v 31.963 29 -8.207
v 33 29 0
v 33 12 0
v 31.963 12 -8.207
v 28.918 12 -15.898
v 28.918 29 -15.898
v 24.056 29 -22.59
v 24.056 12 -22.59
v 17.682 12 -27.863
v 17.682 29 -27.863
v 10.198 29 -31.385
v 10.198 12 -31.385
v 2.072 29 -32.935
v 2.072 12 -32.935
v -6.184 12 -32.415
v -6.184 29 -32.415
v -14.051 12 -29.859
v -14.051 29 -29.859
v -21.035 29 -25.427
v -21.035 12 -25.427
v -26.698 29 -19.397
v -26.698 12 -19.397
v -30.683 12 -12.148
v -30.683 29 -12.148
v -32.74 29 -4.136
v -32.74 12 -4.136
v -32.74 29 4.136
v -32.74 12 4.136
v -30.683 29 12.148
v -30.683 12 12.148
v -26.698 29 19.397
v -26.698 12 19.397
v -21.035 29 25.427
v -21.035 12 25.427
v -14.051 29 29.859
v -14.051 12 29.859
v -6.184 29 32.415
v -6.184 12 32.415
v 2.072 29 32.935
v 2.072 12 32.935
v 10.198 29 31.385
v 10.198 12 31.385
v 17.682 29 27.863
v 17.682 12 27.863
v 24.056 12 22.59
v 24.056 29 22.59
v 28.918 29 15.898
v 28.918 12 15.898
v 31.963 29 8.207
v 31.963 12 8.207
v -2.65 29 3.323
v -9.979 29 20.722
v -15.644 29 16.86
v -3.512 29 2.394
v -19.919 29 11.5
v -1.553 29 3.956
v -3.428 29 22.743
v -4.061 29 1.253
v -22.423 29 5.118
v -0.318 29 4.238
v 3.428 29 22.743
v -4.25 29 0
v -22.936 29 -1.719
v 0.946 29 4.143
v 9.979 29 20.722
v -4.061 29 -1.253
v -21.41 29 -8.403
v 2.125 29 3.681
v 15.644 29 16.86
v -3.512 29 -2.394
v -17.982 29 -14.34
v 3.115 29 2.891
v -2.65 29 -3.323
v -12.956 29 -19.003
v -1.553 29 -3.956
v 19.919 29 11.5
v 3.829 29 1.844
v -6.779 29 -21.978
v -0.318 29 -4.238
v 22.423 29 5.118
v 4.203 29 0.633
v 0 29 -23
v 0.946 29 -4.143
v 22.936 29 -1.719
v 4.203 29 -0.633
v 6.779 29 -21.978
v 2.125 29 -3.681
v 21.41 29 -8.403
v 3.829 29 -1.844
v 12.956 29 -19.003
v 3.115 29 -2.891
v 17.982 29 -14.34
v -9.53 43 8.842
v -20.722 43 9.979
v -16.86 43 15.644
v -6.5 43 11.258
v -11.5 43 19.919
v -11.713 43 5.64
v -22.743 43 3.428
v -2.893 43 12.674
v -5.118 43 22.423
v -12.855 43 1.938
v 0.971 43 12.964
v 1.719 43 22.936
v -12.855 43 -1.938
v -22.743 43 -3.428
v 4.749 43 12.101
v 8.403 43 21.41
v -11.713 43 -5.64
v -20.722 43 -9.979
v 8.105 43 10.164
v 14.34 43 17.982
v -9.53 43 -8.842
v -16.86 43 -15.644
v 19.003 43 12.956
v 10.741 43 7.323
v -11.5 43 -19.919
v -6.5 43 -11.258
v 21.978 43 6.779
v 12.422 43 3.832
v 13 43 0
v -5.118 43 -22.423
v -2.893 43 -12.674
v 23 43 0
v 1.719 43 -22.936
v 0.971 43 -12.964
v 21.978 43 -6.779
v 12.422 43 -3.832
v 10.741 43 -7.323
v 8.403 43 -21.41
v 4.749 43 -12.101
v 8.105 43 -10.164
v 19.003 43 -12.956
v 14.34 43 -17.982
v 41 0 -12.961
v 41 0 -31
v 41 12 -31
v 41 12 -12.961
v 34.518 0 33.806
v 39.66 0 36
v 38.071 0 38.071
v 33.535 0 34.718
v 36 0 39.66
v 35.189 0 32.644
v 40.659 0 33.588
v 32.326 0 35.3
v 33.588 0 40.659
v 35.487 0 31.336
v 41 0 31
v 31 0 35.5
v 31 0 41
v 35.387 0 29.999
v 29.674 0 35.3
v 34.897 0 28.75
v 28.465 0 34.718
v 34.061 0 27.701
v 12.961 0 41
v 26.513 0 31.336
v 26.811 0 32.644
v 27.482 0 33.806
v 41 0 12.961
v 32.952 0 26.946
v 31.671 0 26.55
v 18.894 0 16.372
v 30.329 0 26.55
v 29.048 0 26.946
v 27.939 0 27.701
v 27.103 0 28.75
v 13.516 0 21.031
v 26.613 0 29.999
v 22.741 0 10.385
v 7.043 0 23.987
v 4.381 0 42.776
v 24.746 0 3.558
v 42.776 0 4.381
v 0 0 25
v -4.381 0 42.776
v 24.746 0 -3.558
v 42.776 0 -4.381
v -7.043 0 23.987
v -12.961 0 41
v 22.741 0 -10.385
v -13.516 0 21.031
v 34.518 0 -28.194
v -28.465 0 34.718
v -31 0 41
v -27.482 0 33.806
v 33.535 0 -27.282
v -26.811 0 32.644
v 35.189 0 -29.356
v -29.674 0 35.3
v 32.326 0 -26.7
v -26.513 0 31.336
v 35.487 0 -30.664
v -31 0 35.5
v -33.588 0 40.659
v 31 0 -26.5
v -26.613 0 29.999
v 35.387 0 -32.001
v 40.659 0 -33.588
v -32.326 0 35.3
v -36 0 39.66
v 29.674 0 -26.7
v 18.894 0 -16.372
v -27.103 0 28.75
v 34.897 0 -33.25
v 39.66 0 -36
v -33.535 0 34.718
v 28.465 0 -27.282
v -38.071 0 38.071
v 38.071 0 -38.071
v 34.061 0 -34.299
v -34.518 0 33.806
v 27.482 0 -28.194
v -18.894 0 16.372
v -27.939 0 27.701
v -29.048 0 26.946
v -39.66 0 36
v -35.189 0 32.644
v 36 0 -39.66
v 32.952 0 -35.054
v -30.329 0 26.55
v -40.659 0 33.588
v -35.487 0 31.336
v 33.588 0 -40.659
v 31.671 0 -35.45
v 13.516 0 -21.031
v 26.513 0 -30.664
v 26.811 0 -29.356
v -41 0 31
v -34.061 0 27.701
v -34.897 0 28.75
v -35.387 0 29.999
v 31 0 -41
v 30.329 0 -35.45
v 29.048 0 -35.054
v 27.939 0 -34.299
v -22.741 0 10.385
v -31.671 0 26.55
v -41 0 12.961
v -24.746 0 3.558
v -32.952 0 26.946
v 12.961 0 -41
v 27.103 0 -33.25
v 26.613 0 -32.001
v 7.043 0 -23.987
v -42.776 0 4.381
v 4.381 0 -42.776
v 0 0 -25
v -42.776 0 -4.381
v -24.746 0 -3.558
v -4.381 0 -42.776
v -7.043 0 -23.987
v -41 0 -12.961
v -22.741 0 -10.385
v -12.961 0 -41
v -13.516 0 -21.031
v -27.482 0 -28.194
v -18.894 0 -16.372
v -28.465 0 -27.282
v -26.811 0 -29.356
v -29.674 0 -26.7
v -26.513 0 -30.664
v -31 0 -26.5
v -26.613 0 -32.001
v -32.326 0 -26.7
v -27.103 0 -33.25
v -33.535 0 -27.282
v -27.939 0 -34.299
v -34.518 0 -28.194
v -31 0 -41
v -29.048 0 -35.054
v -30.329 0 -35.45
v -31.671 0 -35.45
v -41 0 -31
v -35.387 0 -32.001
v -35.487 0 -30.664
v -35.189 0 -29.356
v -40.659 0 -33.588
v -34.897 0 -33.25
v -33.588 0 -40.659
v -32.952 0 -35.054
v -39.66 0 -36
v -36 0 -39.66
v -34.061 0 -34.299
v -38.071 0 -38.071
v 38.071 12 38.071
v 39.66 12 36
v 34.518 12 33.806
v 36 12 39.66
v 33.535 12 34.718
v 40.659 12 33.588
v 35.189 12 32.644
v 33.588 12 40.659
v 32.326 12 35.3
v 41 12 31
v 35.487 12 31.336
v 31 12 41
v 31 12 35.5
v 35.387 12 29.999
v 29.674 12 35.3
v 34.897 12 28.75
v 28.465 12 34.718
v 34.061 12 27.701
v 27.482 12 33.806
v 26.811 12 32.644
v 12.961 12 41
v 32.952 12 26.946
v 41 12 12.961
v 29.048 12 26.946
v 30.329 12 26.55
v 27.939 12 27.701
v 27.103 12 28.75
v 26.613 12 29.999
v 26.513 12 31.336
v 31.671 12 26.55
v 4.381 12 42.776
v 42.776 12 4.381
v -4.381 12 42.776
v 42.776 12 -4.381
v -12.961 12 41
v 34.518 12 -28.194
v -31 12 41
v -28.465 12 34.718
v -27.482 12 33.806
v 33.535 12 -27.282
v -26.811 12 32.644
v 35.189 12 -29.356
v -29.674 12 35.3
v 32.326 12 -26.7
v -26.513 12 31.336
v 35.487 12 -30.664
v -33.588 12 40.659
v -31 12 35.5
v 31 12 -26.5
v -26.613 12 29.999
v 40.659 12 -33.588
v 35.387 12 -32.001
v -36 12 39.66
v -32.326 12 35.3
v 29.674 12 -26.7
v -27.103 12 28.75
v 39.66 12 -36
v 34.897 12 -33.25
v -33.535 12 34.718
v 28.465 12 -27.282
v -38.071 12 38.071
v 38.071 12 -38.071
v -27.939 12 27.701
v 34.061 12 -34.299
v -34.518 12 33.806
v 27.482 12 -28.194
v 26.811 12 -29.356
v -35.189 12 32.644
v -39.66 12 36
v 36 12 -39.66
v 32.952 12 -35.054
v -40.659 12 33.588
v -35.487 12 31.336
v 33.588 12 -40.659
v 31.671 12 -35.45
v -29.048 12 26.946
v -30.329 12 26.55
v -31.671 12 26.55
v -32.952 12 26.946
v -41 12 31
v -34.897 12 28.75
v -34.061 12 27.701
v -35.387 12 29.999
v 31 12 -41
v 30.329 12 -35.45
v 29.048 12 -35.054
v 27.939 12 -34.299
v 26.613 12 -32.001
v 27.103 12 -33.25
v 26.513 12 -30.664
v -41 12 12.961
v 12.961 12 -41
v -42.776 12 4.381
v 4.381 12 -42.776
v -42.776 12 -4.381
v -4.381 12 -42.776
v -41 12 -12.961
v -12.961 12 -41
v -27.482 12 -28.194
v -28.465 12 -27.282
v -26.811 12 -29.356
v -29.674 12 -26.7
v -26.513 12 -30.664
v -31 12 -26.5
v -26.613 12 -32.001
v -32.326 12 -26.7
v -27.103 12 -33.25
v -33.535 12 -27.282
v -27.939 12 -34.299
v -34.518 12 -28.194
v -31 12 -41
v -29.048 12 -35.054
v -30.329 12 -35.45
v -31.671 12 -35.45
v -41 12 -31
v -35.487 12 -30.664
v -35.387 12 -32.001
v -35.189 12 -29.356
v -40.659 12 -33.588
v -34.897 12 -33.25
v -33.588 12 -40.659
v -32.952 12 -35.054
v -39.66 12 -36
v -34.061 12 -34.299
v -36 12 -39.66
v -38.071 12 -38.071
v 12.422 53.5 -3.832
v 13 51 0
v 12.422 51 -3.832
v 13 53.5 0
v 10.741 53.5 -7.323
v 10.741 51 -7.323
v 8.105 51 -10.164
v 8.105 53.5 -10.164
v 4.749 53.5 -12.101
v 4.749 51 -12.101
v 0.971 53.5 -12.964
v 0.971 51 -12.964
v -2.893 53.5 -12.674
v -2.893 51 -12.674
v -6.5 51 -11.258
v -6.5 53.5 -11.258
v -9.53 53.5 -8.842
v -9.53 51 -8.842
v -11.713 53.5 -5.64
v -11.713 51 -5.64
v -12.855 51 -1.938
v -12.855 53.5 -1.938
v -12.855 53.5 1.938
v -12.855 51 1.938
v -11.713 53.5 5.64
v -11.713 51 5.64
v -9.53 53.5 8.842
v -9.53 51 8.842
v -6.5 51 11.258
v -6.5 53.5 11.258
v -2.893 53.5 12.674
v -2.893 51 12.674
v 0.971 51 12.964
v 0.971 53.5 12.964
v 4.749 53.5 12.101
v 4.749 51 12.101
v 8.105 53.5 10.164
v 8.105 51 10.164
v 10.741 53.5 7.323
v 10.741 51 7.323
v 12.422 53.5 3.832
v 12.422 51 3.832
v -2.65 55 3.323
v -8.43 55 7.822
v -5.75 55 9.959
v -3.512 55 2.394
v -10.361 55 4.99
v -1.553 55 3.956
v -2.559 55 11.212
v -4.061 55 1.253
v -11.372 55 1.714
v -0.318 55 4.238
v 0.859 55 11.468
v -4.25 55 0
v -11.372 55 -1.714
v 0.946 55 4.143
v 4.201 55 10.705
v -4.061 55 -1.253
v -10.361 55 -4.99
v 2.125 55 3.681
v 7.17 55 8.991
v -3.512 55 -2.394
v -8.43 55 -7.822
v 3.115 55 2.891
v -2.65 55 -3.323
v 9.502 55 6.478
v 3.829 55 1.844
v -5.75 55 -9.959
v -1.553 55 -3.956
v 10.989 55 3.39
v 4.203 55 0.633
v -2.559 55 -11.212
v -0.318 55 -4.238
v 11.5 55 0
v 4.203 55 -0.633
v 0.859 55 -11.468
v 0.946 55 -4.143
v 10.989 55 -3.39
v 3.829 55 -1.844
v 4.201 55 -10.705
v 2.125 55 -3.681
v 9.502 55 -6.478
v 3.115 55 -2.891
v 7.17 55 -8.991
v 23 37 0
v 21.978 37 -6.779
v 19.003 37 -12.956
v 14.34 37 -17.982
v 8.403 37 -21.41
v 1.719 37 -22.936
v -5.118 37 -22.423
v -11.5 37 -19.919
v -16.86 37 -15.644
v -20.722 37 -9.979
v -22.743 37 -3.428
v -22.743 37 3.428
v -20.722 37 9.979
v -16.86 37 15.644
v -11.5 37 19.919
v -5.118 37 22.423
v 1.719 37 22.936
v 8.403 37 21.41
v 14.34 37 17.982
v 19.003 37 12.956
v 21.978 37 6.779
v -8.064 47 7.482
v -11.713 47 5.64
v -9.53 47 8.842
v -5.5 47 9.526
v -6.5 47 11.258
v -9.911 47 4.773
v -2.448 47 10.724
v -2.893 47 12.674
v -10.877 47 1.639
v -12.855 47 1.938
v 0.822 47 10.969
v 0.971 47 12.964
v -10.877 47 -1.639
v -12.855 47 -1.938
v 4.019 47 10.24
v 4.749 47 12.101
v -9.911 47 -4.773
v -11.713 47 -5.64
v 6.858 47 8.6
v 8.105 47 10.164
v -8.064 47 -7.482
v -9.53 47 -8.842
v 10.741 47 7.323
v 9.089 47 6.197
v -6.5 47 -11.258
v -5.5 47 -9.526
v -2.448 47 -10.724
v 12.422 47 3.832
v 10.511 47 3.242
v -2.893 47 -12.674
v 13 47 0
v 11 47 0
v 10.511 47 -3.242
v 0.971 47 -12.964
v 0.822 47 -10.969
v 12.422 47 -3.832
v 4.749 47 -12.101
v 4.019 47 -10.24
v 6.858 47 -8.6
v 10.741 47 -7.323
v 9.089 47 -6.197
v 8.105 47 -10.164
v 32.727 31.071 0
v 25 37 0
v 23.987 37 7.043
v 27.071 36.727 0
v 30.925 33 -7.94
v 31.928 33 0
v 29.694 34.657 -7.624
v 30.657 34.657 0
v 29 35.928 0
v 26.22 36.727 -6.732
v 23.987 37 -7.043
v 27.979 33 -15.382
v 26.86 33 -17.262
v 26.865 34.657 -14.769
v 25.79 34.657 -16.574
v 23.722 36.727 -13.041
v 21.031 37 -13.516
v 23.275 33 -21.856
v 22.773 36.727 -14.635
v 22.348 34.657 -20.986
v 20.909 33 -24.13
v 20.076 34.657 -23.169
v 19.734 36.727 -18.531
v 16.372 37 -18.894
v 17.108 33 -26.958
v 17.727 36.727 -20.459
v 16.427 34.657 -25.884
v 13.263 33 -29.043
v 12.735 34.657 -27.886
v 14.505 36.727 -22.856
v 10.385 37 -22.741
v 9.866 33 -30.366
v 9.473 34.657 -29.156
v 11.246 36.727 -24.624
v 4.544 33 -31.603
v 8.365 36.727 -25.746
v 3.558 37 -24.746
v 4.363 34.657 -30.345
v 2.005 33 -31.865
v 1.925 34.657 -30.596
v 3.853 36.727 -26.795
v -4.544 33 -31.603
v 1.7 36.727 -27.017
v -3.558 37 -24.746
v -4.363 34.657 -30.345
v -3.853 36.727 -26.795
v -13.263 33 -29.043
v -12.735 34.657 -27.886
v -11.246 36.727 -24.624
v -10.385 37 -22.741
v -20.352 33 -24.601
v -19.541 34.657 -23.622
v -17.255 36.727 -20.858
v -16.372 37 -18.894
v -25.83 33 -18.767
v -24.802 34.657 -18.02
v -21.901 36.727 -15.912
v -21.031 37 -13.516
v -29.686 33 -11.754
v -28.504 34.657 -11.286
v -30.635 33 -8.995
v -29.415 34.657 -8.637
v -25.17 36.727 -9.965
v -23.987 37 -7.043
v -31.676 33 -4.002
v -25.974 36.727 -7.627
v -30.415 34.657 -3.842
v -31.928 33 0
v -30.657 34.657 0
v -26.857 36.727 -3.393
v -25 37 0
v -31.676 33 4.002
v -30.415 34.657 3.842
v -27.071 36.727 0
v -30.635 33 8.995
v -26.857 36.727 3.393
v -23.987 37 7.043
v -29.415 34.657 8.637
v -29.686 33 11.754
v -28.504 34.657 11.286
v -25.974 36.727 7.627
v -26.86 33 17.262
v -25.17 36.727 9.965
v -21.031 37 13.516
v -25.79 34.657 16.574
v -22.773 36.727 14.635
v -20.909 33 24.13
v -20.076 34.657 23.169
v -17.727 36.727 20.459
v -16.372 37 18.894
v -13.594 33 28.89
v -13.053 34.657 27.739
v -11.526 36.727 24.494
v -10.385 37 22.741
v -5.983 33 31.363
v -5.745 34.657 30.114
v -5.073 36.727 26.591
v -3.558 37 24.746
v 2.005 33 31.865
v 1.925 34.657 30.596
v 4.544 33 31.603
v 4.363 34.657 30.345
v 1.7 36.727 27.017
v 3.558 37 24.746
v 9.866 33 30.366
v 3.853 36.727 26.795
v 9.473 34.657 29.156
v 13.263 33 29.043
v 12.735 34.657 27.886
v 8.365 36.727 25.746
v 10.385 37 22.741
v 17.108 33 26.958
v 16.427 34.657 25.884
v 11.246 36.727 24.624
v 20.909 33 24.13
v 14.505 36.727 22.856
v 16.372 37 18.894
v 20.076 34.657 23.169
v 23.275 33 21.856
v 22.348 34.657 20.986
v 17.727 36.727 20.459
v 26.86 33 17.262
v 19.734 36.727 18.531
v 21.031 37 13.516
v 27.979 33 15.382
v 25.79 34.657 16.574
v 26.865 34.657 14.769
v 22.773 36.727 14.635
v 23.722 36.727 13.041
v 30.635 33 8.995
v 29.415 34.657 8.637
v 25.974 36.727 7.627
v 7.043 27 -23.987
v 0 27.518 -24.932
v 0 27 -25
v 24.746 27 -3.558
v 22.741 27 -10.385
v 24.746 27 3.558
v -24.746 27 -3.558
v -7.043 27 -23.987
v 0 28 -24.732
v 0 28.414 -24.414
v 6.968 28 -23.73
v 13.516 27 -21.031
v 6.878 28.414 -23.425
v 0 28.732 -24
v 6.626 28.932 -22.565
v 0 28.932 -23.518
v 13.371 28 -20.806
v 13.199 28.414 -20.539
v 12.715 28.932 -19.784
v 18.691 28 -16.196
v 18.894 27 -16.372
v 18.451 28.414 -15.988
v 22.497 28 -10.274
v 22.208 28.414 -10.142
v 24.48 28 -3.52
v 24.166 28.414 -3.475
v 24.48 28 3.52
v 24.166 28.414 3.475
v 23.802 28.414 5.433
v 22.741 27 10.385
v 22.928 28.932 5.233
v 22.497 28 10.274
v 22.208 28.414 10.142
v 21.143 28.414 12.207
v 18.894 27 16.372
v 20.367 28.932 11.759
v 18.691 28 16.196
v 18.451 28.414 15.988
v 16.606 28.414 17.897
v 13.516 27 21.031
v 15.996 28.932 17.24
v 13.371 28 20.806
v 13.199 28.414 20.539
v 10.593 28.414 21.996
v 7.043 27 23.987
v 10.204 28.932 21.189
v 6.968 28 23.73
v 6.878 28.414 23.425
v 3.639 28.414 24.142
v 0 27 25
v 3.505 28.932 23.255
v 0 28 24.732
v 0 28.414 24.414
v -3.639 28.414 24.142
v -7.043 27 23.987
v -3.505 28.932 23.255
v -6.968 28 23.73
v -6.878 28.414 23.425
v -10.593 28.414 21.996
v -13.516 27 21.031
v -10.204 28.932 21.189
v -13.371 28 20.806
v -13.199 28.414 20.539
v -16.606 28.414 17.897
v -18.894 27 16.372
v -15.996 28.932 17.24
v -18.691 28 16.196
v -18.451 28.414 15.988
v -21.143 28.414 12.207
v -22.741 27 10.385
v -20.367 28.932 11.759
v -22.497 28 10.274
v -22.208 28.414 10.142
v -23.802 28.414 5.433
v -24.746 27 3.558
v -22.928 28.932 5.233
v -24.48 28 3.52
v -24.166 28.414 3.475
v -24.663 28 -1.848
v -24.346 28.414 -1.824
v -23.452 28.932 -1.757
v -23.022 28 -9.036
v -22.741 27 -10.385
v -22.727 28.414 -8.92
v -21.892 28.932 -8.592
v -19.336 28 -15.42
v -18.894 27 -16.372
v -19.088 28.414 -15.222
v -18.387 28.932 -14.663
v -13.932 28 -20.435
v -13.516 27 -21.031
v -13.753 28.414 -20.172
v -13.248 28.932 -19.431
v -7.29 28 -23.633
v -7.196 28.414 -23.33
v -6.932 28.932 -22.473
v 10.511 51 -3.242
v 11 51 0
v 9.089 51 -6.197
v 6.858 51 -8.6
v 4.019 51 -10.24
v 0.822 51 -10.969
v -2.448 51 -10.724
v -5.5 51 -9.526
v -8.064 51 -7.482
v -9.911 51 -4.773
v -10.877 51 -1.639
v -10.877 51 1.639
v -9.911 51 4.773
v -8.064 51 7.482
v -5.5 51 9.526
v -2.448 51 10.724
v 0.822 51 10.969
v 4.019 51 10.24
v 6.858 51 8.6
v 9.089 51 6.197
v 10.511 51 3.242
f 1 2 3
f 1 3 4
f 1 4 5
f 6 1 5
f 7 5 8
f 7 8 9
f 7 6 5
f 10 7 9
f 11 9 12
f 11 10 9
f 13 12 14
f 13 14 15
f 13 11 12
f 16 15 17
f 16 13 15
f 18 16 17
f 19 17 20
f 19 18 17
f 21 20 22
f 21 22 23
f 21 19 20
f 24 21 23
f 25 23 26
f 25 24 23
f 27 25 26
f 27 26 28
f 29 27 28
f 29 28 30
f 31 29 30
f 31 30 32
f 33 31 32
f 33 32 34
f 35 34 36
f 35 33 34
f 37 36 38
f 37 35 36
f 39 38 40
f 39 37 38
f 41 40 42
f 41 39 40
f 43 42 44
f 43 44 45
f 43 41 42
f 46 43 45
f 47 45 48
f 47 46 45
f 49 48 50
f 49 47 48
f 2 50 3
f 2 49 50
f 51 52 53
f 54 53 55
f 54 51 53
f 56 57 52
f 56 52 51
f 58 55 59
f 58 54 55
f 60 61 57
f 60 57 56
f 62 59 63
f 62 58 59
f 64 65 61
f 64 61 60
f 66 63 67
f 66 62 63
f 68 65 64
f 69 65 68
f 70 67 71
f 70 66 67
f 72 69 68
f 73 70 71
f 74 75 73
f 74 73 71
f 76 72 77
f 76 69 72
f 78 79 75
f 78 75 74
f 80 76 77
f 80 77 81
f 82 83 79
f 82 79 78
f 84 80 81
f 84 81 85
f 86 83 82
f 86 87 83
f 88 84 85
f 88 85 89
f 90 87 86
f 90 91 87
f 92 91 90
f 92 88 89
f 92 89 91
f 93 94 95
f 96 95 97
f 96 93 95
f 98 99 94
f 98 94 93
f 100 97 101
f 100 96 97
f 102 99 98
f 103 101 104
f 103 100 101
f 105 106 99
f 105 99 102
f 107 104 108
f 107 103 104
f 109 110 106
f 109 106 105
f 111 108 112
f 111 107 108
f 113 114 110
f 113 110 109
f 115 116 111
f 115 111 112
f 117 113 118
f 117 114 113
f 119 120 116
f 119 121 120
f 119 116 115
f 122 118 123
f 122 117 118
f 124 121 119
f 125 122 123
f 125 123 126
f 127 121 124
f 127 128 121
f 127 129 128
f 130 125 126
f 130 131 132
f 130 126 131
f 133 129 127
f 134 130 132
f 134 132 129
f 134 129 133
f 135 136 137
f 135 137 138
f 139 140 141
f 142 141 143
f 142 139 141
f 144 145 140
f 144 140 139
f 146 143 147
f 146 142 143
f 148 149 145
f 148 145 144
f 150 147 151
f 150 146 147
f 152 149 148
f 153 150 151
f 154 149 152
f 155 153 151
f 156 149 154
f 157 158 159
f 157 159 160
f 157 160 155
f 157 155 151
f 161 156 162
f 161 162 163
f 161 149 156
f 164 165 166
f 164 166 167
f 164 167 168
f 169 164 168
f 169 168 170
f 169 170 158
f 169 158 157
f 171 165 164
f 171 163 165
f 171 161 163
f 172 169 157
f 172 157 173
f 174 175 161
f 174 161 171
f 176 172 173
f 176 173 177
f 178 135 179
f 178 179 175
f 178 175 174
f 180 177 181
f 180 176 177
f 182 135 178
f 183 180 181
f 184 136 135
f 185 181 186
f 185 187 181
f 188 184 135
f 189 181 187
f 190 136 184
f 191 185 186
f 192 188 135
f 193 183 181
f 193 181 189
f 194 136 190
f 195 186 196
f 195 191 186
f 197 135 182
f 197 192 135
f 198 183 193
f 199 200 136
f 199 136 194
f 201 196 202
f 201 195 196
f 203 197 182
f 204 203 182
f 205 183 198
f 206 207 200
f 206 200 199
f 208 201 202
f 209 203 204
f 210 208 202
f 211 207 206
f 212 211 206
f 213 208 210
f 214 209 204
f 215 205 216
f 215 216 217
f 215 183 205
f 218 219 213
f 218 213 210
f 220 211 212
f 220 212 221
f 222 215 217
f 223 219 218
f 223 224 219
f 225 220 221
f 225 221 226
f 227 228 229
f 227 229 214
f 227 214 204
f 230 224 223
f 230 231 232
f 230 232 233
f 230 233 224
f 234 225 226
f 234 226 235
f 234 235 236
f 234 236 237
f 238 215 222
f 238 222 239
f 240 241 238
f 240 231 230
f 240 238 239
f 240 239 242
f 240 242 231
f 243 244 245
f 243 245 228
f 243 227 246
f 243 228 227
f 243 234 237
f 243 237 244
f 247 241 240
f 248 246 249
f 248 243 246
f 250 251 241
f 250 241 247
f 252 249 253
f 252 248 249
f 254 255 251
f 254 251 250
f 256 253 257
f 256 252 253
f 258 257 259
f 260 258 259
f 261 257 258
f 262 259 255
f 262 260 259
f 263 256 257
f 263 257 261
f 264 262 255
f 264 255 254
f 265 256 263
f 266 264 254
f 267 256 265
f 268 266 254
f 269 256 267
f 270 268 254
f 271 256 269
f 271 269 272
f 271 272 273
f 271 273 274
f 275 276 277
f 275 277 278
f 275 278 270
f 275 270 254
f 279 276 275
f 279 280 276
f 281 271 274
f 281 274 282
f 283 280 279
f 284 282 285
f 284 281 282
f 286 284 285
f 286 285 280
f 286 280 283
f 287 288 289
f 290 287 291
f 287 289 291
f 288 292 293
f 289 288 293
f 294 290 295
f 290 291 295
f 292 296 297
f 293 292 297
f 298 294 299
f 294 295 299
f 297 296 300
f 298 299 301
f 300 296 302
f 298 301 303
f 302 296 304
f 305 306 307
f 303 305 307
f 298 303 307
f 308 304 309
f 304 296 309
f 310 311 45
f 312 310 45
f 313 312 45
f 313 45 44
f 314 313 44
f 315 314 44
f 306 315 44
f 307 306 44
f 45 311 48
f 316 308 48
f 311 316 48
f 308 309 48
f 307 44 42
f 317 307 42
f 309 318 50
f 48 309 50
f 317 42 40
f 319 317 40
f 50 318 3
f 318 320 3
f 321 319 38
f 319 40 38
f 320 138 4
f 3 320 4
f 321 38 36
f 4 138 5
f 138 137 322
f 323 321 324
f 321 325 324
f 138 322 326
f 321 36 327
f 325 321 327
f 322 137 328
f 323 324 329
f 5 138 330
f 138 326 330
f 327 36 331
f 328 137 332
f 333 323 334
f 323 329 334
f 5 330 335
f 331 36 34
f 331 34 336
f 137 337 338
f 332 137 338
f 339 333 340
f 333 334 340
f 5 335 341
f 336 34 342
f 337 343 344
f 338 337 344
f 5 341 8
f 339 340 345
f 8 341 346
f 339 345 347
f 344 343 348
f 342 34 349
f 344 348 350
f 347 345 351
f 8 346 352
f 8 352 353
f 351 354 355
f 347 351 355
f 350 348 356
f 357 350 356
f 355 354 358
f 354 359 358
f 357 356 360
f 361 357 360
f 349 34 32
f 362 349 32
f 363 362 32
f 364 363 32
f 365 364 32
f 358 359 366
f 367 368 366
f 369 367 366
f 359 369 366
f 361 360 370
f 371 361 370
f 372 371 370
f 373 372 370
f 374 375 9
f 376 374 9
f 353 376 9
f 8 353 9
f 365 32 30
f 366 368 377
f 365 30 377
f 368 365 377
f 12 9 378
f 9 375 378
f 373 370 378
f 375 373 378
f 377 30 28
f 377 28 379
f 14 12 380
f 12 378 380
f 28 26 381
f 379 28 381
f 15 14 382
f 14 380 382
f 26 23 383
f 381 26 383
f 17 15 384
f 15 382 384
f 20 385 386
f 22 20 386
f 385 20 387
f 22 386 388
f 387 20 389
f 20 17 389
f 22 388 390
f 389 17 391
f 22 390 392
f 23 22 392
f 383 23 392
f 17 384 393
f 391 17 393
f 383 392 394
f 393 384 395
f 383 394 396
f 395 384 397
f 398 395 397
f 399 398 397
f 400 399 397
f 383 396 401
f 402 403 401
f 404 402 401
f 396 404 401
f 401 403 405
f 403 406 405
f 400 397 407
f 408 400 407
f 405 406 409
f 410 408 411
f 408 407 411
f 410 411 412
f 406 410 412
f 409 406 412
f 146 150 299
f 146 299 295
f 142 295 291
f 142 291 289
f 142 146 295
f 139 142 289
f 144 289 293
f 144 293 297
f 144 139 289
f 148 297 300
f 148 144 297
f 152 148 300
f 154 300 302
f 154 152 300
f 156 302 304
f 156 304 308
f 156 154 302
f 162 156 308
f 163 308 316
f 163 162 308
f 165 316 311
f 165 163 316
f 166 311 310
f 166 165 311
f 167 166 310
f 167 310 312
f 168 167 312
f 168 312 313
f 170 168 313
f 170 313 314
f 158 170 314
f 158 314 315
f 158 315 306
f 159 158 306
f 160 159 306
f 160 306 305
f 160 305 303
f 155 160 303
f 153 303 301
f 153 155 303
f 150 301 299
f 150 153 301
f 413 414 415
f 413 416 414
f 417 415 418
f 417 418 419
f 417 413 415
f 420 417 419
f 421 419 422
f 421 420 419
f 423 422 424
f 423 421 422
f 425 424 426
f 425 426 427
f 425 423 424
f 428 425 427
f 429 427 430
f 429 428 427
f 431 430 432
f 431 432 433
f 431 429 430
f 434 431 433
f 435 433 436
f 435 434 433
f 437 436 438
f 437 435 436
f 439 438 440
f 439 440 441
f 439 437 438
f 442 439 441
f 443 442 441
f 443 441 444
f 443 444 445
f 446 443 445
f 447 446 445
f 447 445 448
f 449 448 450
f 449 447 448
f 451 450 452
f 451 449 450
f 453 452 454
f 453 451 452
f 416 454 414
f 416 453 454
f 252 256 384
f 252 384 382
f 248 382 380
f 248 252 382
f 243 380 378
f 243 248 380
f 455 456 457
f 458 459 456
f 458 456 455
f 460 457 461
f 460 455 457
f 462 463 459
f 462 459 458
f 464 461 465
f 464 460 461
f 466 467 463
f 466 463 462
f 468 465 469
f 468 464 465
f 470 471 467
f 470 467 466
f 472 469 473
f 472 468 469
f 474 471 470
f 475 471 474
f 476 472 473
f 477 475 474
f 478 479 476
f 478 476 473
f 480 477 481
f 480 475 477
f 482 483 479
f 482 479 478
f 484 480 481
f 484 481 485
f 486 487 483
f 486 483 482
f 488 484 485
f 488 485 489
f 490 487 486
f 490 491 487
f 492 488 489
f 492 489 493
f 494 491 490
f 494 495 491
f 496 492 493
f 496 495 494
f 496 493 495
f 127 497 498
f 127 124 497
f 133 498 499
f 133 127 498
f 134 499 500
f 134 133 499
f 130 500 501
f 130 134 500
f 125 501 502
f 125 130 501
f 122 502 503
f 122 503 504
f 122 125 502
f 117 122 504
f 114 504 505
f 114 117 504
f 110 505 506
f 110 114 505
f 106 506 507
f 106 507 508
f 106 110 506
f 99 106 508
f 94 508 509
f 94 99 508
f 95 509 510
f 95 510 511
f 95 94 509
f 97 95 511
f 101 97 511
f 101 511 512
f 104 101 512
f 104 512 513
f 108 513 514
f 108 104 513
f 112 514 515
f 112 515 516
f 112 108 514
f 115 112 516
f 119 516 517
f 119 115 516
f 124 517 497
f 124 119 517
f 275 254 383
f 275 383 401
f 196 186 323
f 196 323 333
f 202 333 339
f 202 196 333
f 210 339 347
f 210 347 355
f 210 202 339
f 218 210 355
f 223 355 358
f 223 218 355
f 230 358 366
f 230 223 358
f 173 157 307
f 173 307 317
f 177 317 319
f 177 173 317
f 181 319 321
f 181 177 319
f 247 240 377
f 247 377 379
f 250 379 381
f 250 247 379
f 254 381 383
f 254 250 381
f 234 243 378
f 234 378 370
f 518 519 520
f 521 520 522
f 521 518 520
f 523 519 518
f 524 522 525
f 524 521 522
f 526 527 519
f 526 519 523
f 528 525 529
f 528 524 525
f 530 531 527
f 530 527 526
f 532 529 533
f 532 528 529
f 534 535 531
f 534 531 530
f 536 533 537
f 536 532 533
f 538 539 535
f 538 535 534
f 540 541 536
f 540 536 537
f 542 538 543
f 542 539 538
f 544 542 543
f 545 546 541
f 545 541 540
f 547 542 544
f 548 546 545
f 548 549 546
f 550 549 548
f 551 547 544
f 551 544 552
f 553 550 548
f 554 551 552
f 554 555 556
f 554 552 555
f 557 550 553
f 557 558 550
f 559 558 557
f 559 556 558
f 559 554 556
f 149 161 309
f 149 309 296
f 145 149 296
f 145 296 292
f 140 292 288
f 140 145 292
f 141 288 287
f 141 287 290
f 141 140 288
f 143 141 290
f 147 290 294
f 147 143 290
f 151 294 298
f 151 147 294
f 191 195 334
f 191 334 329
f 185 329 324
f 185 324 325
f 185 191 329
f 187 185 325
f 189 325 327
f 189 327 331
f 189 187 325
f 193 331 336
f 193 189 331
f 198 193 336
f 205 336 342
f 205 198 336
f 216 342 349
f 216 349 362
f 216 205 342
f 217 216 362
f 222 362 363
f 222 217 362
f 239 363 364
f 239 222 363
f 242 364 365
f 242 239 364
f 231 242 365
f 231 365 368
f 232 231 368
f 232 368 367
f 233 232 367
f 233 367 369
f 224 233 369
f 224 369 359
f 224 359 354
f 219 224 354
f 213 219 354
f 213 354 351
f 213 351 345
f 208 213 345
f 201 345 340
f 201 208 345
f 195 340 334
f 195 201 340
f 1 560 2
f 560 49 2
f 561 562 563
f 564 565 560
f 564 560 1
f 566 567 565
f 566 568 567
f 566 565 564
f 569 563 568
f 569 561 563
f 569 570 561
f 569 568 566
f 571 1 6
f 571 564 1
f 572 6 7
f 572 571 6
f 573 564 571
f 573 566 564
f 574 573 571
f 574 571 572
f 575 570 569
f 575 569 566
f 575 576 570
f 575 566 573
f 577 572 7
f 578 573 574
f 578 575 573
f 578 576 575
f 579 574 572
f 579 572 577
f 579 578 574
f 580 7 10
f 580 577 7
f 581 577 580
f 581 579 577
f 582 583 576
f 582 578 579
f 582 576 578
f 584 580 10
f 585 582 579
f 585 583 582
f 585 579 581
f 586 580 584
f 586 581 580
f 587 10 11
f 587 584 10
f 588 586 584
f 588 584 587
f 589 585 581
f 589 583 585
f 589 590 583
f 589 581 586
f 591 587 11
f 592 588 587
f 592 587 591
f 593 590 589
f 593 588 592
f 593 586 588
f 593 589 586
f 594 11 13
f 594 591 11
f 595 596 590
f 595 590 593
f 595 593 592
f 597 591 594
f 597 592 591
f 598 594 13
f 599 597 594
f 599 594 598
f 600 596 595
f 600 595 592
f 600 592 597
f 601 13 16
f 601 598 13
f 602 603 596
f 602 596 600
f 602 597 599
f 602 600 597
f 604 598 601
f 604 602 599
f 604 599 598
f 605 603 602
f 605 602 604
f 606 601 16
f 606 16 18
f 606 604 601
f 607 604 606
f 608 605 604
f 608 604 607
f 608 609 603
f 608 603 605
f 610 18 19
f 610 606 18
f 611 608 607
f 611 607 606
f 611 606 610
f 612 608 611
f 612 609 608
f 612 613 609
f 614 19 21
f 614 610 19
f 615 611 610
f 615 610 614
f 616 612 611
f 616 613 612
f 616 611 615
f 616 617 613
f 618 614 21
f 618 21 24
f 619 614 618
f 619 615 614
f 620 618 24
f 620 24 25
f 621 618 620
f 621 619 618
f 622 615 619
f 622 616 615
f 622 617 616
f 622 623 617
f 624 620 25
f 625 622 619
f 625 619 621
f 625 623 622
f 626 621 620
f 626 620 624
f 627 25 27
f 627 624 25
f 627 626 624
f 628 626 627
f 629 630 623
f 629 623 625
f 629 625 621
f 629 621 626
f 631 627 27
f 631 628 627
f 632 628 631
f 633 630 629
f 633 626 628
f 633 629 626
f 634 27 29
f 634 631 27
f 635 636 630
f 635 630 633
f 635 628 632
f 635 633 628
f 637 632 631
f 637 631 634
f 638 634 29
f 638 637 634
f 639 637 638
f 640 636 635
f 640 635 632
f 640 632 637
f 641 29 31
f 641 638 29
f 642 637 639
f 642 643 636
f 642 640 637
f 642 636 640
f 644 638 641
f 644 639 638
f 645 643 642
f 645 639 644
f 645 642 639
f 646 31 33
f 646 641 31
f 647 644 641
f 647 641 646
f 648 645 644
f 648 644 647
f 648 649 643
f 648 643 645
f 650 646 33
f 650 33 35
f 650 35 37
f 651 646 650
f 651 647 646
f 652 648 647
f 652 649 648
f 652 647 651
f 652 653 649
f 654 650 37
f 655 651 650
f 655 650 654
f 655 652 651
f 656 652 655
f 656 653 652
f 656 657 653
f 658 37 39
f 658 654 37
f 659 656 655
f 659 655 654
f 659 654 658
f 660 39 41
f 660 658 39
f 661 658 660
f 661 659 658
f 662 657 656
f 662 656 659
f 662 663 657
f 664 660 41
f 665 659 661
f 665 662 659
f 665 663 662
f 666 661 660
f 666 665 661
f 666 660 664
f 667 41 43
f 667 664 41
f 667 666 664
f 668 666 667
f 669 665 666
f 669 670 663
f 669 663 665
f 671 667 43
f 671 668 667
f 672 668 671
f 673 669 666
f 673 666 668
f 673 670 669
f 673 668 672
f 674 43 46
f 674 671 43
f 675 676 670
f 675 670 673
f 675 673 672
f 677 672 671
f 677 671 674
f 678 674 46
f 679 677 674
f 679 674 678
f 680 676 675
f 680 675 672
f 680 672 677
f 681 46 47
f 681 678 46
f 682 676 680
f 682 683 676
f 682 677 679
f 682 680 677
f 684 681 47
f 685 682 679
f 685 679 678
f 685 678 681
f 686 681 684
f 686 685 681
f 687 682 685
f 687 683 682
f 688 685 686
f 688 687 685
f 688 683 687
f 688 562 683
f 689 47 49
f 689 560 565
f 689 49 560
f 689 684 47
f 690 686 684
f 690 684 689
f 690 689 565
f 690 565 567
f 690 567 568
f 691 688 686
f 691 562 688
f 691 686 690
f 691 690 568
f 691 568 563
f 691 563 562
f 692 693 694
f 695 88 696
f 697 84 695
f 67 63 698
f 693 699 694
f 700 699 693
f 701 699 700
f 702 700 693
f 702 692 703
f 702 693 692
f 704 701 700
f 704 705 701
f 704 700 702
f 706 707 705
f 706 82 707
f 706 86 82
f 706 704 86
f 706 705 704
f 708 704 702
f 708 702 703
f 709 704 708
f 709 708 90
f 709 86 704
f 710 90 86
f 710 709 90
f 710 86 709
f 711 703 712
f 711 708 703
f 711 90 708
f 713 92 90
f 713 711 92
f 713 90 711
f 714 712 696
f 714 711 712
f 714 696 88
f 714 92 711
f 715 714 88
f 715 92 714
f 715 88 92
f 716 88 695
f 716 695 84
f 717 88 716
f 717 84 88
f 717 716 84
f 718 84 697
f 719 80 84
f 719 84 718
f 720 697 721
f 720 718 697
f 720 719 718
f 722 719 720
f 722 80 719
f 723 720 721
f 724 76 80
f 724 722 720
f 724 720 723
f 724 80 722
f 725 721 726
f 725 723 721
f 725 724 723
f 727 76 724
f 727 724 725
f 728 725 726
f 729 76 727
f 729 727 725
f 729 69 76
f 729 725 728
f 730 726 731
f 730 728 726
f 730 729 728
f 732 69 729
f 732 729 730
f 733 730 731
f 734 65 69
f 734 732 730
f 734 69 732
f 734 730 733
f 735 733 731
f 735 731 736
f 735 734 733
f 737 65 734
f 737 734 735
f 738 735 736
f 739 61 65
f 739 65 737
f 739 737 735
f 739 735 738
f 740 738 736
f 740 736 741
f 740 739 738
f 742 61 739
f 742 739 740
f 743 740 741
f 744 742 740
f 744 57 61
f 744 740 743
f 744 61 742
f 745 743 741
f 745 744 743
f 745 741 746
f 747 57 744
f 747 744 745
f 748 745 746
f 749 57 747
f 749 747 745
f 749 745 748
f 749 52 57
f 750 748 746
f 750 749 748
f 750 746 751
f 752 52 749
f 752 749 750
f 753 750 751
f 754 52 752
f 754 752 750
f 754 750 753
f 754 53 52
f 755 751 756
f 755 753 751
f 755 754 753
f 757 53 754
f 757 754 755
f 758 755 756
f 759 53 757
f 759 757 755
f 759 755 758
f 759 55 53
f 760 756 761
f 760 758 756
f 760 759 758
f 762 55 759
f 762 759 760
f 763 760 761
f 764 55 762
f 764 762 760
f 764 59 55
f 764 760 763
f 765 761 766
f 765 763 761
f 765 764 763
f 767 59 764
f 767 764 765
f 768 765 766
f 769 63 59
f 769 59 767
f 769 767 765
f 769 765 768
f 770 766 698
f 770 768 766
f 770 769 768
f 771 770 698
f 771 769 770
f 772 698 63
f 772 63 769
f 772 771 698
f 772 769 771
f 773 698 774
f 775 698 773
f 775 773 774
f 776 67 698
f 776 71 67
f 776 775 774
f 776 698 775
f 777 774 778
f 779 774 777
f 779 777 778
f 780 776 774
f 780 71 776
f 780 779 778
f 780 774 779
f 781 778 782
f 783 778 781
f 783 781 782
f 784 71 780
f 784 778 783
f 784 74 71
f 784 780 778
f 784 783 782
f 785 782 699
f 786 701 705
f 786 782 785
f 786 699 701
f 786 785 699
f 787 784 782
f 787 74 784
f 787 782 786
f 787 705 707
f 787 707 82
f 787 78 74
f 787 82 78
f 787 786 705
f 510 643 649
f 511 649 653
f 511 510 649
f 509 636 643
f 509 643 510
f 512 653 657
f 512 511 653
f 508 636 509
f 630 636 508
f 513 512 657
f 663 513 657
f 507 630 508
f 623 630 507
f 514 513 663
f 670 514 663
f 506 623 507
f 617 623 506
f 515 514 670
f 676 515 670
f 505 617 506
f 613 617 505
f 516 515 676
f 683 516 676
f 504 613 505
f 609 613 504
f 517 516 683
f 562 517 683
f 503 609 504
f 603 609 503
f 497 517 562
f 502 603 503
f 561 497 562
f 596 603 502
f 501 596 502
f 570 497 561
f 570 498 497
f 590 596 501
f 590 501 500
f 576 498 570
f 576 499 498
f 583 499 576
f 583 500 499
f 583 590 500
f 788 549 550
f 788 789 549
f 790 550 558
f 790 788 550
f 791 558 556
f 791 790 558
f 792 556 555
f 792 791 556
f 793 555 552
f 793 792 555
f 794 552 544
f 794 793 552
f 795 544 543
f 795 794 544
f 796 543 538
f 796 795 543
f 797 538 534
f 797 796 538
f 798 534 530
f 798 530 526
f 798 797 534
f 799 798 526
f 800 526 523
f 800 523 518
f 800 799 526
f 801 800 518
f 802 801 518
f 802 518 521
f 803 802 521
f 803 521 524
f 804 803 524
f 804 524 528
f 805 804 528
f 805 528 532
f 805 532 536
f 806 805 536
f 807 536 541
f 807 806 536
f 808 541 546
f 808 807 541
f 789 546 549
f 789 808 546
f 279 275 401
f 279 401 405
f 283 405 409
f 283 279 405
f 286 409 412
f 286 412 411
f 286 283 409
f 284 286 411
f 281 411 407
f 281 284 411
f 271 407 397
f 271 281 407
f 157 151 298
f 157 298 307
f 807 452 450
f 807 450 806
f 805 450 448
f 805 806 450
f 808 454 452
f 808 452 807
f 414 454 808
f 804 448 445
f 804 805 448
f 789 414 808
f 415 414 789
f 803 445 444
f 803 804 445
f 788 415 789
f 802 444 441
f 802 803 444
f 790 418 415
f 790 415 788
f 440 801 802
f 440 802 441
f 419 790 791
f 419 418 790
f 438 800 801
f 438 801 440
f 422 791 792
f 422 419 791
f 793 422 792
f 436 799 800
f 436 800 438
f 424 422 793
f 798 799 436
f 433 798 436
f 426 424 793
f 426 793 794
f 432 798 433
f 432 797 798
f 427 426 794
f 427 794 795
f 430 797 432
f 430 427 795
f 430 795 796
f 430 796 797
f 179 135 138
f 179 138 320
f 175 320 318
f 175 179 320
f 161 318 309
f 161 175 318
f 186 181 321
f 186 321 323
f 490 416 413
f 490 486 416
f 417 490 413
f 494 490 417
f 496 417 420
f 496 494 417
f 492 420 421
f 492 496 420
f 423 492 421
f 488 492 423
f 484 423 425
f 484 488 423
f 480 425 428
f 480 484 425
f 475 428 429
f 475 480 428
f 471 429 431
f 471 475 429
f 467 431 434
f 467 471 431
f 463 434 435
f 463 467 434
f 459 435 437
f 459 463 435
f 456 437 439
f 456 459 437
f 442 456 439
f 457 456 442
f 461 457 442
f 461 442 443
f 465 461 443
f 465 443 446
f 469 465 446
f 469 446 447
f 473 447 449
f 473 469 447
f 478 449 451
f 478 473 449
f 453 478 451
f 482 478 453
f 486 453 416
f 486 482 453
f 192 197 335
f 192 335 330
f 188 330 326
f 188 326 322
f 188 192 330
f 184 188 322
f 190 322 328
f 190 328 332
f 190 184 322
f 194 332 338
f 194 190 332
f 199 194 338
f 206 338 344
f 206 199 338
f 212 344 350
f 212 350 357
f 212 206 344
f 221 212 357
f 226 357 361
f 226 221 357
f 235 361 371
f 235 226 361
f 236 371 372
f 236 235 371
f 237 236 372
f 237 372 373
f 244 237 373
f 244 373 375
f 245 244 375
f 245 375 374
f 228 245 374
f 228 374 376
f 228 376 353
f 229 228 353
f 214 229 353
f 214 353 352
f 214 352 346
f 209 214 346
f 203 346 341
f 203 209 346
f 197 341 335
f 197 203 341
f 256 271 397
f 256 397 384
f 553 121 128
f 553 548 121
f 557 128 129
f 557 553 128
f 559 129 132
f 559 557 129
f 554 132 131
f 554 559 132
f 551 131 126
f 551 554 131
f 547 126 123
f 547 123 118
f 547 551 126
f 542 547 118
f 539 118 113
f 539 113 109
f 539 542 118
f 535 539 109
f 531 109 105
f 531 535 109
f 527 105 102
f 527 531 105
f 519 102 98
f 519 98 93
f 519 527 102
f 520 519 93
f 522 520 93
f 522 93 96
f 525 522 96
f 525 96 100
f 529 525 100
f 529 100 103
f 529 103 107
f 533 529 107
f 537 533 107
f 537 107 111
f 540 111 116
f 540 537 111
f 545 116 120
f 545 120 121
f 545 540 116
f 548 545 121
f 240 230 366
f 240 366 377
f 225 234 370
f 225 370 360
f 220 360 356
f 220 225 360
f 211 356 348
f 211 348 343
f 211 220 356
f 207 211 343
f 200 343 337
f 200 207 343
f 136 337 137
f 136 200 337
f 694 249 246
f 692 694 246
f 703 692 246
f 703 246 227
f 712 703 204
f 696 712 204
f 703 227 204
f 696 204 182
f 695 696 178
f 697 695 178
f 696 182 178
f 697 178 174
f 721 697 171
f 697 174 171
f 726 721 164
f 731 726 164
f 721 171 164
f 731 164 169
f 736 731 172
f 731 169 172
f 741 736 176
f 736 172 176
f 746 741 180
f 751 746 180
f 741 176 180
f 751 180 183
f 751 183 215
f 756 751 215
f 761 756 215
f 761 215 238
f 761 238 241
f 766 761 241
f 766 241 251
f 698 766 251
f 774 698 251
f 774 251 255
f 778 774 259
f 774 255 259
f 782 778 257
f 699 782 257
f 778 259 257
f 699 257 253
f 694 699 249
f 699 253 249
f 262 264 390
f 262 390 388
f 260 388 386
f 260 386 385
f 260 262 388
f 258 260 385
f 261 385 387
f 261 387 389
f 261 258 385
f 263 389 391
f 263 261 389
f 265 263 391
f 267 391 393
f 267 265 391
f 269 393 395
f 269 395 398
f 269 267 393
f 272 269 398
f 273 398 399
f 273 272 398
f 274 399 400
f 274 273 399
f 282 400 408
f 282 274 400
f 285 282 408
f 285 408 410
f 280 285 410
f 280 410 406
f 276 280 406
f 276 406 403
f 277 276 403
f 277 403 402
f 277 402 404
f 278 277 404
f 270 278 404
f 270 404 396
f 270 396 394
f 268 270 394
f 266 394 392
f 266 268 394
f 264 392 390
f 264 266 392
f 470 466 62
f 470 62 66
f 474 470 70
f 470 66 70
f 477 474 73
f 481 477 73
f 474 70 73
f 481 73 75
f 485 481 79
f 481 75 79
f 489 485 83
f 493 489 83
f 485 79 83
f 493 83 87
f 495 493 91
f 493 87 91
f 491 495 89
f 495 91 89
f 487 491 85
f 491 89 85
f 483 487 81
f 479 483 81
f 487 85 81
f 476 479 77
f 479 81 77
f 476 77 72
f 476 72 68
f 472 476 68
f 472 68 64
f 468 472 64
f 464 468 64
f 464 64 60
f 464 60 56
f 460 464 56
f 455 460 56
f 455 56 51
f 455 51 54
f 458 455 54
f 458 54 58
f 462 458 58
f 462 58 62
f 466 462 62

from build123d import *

# Parameters (mm, degrees)
SKETCH_1_R          = 4.5
EXTRUDE_1_DEPTH     = 12
FILLET_1_R          = 8
SKETCH_3_R          = 25
CUT_EXTRUDE_1_DEPTH = 29
FILLET_2_R          = 2
HOLE_WIZARD_M10_1_D = 8.5


with BuildPart() as part:
    # 草图1 → 凸台-拉伸1 (new body)
    with BuildSketch(Plane(origin=(0, 0, 0), x_dir=(1, 0, 0), z_dir=(0, 1, 0))):
        with BuildLine():
            Line((-41, 12.961481397), (-41, 31))
            ThreePointArc((-41, 31), (-38.071067812, 38.071067812), (-31, 41))
            Line((-31, 41), (-12.961481397, 41))
            ThreePointArc((-12.961481397, 41), (0, 43), (12.961481397, 41))
            Line((12.961481397, 41), (31, 41))
            ThreePointArc((31, 41), (38.071067812, 38.071067812), (41, 31))
            Line((41, 31), (41, 12.961481397))
            ThreePointArc((41, 12.961481397), (43, 0), (41, -12.961481397))
            Line((41, -12.961481397), (41, -31))
            ThreePointArc((41, -31), (38.071067812, -38.071067812), (31, -41))
            Line((31, -41), (12.961481397, -41))
            ThreePointArc((12.961481397, -41), (0, -43), (-12.961481397, -41))
            Line((-12.961481397, -41), (-31, -41))
            ThreePointArc((-31, -41), (-38.071067812, -38.071067812), (-41, -31))
            Line((-41, -31), (-41, -12.961481397))
            ThreePointArc((-41, -12.961481397), (-43, 0), (-41, 12.961481397))
        make_face()
        with Locations(Location((-31, 31, 0), (0, 0, 270))):
            Circle(SKETCH_1_R, mode=Mode.SUBTRACT)
        with Locations(Location((31, 31, 0), (0, 0, 270))):
            Circle(SKETCH_1_R, mode=Mode.SUBTRACT)
        with Locations(Location((31, -31, 0), (0, 0, 270))):
            Circle(SKETCH_1_R, mode=Mode.SUBTRACT)
        with Locations(Location((-31, -31, 0), (0, 0, 270))):
            Circle(SKETCH_1_R, mode=Mode.SUBTRACT)
    extrude(amount=EXTRUDE_1_DEPTH)

    # 草图2 → 旋转1 (revolve)
    with BuildSketch(Plane.XY):
        Polygon((0, 12), (33, 12), (33, 37), (23, 37), (23, 43), (13, 43), (13, 47), (11, 47), (11, 51), (13, 51), (13, 53.5), (11.5, 55), (0, 55), align=None)
    revolve(axis=Axis((0, 12, 0), (0, 1, 0)))

    # 圆角1
    fillet_1_edges = [part.edges().sort_by_distance(p)[0] for p in [
        (-33, 37, 0),
    ]]
    fillet(fillet_1_edges, radius=FILLET_1_R)

    # 草图3 → 切除-拉伸1 (cut)
    with BuildSketch(Plane.XZ):
        with Locations(Location((0, 0, 0), (0, 0, 270))):
            Circle(SKETCH_3_R)
    extrude(amount=-CUT_EXTRUDE_1_DEPTH, mode=Mode.SUBTRACT)

    # 圆角2
    fillet_2_edges = [part.edges().sort_by_distance(p)[0] for p in [
        (0, 29, 25),
    ]]
    fillet(fillet_2_edges, radius=FILLET_2_R)

    # M10 螺纹孔1 (through all)
    with Locations(Plane(origin=(0, 55, 0), x_dir=(1, 0, 0), z_dir=(0, 1, 0))):
        with Locations((0, 0)):
            Hole(HOLE_WIZARD_M10_1_D / 2)


solid = part.part
